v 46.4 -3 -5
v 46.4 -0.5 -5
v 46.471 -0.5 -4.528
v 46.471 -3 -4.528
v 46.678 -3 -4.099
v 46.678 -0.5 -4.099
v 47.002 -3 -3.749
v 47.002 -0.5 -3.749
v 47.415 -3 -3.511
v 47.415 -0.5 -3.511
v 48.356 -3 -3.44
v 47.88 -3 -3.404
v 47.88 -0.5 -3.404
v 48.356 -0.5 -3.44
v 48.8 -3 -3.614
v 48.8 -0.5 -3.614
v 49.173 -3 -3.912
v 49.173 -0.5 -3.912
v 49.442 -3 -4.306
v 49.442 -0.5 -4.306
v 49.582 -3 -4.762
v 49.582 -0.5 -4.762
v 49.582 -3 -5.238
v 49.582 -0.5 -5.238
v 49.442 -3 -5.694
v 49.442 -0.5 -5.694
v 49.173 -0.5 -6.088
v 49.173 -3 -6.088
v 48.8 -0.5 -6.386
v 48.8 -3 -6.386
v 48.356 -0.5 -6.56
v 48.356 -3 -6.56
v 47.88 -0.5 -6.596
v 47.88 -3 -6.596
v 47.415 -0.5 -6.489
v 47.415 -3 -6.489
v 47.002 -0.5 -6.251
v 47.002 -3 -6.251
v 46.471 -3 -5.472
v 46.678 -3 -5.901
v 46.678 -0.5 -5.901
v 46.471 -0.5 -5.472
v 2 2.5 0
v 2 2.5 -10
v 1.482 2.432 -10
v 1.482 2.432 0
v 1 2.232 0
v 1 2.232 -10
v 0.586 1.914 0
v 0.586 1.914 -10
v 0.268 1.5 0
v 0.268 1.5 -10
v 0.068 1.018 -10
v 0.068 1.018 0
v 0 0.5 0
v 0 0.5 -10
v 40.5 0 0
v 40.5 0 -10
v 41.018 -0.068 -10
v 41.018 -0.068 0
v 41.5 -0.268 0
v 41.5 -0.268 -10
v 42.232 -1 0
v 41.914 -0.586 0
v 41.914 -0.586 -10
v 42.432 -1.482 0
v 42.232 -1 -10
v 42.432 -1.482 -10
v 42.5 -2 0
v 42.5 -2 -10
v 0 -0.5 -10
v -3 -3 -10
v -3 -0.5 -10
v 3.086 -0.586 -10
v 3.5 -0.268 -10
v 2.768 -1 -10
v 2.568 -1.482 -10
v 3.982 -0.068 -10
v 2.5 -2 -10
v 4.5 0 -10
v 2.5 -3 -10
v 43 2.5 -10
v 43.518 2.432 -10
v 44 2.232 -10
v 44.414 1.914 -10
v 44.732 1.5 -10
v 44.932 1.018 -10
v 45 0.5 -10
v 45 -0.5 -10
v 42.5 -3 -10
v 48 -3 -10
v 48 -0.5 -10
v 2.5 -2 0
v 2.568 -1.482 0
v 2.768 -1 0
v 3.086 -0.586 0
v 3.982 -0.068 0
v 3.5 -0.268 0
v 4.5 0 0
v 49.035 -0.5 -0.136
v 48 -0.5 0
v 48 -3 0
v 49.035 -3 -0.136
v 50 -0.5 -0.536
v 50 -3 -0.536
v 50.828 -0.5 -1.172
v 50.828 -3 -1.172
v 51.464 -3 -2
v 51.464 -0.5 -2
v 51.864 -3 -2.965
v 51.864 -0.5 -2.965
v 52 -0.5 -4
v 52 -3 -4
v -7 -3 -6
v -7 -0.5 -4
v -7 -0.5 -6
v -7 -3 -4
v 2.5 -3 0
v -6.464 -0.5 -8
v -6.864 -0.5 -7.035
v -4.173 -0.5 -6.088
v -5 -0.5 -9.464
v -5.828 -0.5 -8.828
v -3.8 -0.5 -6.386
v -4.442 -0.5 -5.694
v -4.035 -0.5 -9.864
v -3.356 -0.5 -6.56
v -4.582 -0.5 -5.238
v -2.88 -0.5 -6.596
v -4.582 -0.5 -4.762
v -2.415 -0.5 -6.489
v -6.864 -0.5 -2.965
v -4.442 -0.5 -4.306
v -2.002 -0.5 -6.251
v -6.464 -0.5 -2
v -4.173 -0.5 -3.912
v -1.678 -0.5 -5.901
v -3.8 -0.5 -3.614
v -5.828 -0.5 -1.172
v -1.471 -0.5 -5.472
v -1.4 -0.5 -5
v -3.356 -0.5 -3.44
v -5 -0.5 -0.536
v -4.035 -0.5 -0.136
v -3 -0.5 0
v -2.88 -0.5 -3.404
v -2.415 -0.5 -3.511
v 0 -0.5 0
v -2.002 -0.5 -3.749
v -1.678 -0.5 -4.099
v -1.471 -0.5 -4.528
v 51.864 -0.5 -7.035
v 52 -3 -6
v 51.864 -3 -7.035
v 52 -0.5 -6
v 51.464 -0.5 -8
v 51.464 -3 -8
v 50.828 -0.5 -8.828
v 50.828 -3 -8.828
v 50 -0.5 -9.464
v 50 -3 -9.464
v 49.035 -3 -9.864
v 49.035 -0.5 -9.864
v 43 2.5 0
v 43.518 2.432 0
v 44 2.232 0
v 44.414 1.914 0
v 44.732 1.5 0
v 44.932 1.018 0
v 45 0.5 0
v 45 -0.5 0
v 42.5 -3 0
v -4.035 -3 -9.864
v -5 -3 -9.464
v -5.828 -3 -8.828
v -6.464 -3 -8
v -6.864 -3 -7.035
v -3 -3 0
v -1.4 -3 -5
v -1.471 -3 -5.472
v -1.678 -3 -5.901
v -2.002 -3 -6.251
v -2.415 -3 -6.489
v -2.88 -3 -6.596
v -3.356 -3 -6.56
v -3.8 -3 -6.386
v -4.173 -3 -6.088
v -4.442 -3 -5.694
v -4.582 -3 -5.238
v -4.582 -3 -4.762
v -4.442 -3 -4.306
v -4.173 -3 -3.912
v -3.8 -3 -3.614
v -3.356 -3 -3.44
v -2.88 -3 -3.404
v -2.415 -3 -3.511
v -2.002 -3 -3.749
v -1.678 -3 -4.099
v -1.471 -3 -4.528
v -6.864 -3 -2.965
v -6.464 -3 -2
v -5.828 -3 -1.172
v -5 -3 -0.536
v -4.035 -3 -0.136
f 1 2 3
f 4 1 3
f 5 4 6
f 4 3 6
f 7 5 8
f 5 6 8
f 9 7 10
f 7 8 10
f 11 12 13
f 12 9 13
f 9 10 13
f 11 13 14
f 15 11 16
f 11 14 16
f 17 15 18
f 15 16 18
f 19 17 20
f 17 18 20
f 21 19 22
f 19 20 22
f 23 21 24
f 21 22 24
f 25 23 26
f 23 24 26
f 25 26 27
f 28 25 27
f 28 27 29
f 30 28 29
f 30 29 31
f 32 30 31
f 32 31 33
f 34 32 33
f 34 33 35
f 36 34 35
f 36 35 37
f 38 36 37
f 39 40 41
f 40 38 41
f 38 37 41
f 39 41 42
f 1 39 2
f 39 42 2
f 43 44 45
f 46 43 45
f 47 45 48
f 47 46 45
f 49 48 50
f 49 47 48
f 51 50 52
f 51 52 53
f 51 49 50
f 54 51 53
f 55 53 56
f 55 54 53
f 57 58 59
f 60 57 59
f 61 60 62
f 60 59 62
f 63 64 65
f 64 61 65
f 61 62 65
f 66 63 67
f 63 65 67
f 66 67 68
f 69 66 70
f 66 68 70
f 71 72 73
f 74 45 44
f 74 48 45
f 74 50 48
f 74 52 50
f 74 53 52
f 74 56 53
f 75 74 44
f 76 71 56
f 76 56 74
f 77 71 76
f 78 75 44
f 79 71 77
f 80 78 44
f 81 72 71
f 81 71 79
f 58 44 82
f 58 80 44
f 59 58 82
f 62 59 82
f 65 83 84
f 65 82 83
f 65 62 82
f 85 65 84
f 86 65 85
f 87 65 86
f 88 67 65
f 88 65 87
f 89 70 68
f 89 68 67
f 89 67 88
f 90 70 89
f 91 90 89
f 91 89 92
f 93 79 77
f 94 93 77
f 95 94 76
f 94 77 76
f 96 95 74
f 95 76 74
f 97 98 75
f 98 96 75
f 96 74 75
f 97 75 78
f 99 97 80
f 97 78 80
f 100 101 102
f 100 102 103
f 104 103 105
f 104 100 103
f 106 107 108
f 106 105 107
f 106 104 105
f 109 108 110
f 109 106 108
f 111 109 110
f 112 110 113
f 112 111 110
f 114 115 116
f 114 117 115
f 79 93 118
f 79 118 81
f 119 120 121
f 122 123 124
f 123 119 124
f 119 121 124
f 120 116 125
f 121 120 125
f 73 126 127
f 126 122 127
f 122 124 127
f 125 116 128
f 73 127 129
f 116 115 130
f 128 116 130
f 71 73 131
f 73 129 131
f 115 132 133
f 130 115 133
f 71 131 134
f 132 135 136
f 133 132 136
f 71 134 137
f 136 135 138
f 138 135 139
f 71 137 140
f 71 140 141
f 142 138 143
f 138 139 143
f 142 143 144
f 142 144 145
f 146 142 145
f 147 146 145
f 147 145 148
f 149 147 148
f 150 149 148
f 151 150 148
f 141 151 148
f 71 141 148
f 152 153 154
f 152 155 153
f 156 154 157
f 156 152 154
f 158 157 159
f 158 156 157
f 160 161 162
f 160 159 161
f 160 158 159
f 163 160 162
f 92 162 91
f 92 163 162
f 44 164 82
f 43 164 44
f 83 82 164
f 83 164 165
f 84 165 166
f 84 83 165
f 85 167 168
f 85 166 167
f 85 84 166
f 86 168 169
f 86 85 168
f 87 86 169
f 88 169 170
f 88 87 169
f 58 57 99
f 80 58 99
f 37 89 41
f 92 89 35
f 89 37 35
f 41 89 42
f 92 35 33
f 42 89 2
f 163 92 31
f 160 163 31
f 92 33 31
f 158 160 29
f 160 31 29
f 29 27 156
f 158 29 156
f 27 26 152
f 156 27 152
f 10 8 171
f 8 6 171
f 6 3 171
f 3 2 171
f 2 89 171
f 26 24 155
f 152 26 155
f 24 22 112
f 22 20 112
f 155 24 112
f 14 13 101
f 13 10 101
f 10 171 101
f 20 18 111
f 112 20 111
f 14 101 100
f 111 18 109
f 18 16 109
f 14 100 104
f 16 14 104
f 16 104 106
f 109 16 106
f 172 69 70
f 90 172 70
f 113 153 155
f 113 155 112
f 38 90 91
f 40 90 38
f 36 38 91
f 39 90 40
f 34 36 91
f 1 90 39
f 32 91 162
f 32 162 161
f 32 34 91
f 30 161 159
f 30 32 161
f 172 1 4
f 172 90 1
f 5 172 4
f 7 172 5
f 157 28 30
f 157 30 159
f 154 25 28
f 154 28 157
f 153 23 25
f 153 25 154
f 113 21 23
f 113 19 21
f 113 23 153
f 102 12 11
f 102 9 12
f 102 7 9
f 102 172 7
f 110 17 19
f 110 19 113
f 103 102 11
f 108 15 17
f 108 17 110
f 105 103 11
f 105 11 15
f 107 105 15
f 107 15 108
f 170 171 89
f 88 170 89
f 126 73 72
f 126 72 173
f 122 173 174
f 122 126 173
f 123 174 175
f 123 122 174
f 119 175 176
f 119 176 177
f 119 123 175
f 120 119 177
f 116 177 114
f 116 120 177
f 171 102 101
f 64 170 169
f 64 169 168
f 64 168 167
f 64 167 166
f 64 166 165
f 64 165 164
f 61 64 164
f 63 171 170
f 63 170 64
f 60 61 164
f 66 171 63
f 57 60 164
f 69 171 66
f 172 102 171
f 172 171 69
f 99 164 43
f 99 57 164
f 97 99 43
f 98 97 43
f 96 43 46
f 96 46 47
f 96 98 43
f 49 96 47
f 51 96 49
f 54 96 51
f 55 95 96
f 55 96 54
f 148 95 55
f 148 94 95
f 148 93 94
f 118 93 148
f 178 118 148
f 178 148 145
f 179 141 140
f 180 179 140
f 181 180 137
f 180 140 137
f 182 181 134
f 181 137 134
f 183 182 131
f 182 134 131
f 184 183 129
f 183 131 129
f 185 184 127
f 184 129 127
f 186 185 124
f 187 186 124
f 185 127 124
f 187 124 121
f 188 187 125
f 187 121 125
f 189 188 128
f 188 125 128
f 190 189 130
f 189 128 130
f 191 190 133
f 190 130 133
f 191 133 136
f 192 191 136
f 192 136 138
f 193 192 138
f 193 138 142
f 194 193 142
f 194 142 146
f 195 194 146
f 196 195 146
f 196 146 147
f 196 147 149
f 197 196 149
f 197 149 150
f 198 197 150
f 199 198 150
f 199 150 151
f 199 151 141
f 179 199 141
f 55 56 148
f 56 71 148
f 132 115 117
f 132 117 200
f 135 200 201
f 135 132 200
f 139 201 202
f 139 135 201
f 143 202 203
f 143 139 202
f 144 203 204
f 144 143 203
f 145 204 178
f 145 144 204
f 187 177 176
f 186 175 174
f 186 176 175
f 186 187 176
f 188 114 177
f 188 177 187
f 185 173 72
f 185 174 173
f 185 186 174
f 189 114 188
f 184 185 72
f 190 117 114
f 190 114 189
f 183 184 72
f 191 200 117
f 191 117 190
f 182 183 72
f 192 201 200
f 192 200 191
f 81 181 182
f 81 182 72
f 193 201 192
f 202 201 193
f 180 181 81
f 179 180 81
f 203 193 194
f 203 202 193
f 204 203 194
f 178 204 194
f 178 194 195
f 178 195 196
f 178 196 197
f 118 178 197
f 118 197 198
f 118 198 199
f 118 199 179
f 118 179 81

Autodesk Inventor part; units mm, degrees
ref_plane "YZ Plane" through (0, 0, 0) normal (1, 0, 0) x (0, 1, 0)
ref_plane "XZ Plane" through (0, 0, 0) normal (0, 1, 0) x (-1, 0, 0)
sketch "Sketch1" plane through (0, 0, 0) normal (0, 1, 0) x (-1, 0, 0)
  line L0 (0, 0) -> (-45, 0)
  line L1 (-45, 0) -> (-45, -10)
  line L2 (-45, -10) -> (0, -10)
  line L3 (0, -10) -> (0, 0)
  dimension "d0" = 10
  dimension "d1" = 45
extrude "Extrusion1" add sketch "Sketch1" along normal blind 2.5
sketch "Sketch2" plane through (0, 0, 0) normal (0, -1, 0) x (1, 0, 0)
  line L0 (0, 0) -> (45, 0) projected
  line L1 (0, -10) -> (0, 0) projected
  line L2 (45, -10) -> (0, -10) projected
  line L3 (45, 0) -> (45, -10) projected
  line L4 (0, 0) -> (45, 0) projected
  line L5 (2.5, 0) -> (2.5, -10)
  line L6 (42.5, 0) -> (42.5, -10)
  line L7 (45, -10) -> (0, -10) projected
  dimension "d4" = 2.5
  dimension "d5" = 2.5
extrude "Extrusion2" add sketch "Sketch2" along normal blind 3 contours L0 L5 L2 L1 | L0 L3 L2 L6
sketch "Sketch3" plane through (0, -3, 0) normal (0, -1, 0) x (1, 0, 0)
  line L0 (0, -10) -> (2.5, -10) projected
  line L1 (2.5, -10) -> (2.5, 0) projected
  line L2 (2.5, 0) -> (0, 0) projected
  line L3 (0, 0) -> (0, -10) projected
  line L4 (0, 0) -> (-7, 0)
  line L5 (-7, 0) -> (-7, -10)
  line L6 (-7, -10) -> (0, -10)
  line L7 (0, -10) -> (0, 0)
  line L8 (0, -10) -> (2.5, -10) projected
  dimension "d8" = 7
extrude "Extrusion3" add sketch "Sketch3" against normal blind 2.5 contours L6 L5 L4 L3
sketch "Sketch4" plane through (0, -0.5, 0) normal (0, 1, 0) x (1, 0, 0)
  line L0 (-7, 0) -> (0, 0) projected
  line L1 (0, 10) -> (0, 0) projected
  line L2 (0, 10) -> (-7, 10) projected
  line L3 (-7, 10) -> (-7, 0) projected
  line L4 (0, 10) -> (0, 0) construction
  line L5 (0, 5) -> (-3, 5) construction
  circle A0 centre (-3, 5) radius 1.6
  dimension "d11" = 3
  dimension "d12" = 3.2
extrude "Extrusion4" cut sketch "Sketch4" against normal up to surface (2.5 mm away) contours A0
ref_plane "Work Plane1" through (22.5, 0, 0) normal (1, 0, 0) x (0, 0, -1)
fillet "Fillet1" radius 4 2 edges at (-7, -1.75, 0) (-7, -1.75, -10)
mirror "Mirror1" about plane through (22.5, 0, 0) normal (1, 0, 0) of "Fillet1", "Extrusion4", "Extrusion3"
fillet "Fillet3" radius 2 4 edges at (2.5, 0, -5) (42.5, 0, -5) (0, 2.5, -5) (45, 2.5, -5)
equation "\"d2\" = wall_thickness"
equation "\"d4\" = wall_thickness"
equation "\"d5\" = wall_thickness"
equation "\"d9\" = wall_thickness"
equation "\"d13\" = wall_thickness"
equation "\"wall_thickness\" = 2.5"
properties part number "battery_mount_1s_500mah"
